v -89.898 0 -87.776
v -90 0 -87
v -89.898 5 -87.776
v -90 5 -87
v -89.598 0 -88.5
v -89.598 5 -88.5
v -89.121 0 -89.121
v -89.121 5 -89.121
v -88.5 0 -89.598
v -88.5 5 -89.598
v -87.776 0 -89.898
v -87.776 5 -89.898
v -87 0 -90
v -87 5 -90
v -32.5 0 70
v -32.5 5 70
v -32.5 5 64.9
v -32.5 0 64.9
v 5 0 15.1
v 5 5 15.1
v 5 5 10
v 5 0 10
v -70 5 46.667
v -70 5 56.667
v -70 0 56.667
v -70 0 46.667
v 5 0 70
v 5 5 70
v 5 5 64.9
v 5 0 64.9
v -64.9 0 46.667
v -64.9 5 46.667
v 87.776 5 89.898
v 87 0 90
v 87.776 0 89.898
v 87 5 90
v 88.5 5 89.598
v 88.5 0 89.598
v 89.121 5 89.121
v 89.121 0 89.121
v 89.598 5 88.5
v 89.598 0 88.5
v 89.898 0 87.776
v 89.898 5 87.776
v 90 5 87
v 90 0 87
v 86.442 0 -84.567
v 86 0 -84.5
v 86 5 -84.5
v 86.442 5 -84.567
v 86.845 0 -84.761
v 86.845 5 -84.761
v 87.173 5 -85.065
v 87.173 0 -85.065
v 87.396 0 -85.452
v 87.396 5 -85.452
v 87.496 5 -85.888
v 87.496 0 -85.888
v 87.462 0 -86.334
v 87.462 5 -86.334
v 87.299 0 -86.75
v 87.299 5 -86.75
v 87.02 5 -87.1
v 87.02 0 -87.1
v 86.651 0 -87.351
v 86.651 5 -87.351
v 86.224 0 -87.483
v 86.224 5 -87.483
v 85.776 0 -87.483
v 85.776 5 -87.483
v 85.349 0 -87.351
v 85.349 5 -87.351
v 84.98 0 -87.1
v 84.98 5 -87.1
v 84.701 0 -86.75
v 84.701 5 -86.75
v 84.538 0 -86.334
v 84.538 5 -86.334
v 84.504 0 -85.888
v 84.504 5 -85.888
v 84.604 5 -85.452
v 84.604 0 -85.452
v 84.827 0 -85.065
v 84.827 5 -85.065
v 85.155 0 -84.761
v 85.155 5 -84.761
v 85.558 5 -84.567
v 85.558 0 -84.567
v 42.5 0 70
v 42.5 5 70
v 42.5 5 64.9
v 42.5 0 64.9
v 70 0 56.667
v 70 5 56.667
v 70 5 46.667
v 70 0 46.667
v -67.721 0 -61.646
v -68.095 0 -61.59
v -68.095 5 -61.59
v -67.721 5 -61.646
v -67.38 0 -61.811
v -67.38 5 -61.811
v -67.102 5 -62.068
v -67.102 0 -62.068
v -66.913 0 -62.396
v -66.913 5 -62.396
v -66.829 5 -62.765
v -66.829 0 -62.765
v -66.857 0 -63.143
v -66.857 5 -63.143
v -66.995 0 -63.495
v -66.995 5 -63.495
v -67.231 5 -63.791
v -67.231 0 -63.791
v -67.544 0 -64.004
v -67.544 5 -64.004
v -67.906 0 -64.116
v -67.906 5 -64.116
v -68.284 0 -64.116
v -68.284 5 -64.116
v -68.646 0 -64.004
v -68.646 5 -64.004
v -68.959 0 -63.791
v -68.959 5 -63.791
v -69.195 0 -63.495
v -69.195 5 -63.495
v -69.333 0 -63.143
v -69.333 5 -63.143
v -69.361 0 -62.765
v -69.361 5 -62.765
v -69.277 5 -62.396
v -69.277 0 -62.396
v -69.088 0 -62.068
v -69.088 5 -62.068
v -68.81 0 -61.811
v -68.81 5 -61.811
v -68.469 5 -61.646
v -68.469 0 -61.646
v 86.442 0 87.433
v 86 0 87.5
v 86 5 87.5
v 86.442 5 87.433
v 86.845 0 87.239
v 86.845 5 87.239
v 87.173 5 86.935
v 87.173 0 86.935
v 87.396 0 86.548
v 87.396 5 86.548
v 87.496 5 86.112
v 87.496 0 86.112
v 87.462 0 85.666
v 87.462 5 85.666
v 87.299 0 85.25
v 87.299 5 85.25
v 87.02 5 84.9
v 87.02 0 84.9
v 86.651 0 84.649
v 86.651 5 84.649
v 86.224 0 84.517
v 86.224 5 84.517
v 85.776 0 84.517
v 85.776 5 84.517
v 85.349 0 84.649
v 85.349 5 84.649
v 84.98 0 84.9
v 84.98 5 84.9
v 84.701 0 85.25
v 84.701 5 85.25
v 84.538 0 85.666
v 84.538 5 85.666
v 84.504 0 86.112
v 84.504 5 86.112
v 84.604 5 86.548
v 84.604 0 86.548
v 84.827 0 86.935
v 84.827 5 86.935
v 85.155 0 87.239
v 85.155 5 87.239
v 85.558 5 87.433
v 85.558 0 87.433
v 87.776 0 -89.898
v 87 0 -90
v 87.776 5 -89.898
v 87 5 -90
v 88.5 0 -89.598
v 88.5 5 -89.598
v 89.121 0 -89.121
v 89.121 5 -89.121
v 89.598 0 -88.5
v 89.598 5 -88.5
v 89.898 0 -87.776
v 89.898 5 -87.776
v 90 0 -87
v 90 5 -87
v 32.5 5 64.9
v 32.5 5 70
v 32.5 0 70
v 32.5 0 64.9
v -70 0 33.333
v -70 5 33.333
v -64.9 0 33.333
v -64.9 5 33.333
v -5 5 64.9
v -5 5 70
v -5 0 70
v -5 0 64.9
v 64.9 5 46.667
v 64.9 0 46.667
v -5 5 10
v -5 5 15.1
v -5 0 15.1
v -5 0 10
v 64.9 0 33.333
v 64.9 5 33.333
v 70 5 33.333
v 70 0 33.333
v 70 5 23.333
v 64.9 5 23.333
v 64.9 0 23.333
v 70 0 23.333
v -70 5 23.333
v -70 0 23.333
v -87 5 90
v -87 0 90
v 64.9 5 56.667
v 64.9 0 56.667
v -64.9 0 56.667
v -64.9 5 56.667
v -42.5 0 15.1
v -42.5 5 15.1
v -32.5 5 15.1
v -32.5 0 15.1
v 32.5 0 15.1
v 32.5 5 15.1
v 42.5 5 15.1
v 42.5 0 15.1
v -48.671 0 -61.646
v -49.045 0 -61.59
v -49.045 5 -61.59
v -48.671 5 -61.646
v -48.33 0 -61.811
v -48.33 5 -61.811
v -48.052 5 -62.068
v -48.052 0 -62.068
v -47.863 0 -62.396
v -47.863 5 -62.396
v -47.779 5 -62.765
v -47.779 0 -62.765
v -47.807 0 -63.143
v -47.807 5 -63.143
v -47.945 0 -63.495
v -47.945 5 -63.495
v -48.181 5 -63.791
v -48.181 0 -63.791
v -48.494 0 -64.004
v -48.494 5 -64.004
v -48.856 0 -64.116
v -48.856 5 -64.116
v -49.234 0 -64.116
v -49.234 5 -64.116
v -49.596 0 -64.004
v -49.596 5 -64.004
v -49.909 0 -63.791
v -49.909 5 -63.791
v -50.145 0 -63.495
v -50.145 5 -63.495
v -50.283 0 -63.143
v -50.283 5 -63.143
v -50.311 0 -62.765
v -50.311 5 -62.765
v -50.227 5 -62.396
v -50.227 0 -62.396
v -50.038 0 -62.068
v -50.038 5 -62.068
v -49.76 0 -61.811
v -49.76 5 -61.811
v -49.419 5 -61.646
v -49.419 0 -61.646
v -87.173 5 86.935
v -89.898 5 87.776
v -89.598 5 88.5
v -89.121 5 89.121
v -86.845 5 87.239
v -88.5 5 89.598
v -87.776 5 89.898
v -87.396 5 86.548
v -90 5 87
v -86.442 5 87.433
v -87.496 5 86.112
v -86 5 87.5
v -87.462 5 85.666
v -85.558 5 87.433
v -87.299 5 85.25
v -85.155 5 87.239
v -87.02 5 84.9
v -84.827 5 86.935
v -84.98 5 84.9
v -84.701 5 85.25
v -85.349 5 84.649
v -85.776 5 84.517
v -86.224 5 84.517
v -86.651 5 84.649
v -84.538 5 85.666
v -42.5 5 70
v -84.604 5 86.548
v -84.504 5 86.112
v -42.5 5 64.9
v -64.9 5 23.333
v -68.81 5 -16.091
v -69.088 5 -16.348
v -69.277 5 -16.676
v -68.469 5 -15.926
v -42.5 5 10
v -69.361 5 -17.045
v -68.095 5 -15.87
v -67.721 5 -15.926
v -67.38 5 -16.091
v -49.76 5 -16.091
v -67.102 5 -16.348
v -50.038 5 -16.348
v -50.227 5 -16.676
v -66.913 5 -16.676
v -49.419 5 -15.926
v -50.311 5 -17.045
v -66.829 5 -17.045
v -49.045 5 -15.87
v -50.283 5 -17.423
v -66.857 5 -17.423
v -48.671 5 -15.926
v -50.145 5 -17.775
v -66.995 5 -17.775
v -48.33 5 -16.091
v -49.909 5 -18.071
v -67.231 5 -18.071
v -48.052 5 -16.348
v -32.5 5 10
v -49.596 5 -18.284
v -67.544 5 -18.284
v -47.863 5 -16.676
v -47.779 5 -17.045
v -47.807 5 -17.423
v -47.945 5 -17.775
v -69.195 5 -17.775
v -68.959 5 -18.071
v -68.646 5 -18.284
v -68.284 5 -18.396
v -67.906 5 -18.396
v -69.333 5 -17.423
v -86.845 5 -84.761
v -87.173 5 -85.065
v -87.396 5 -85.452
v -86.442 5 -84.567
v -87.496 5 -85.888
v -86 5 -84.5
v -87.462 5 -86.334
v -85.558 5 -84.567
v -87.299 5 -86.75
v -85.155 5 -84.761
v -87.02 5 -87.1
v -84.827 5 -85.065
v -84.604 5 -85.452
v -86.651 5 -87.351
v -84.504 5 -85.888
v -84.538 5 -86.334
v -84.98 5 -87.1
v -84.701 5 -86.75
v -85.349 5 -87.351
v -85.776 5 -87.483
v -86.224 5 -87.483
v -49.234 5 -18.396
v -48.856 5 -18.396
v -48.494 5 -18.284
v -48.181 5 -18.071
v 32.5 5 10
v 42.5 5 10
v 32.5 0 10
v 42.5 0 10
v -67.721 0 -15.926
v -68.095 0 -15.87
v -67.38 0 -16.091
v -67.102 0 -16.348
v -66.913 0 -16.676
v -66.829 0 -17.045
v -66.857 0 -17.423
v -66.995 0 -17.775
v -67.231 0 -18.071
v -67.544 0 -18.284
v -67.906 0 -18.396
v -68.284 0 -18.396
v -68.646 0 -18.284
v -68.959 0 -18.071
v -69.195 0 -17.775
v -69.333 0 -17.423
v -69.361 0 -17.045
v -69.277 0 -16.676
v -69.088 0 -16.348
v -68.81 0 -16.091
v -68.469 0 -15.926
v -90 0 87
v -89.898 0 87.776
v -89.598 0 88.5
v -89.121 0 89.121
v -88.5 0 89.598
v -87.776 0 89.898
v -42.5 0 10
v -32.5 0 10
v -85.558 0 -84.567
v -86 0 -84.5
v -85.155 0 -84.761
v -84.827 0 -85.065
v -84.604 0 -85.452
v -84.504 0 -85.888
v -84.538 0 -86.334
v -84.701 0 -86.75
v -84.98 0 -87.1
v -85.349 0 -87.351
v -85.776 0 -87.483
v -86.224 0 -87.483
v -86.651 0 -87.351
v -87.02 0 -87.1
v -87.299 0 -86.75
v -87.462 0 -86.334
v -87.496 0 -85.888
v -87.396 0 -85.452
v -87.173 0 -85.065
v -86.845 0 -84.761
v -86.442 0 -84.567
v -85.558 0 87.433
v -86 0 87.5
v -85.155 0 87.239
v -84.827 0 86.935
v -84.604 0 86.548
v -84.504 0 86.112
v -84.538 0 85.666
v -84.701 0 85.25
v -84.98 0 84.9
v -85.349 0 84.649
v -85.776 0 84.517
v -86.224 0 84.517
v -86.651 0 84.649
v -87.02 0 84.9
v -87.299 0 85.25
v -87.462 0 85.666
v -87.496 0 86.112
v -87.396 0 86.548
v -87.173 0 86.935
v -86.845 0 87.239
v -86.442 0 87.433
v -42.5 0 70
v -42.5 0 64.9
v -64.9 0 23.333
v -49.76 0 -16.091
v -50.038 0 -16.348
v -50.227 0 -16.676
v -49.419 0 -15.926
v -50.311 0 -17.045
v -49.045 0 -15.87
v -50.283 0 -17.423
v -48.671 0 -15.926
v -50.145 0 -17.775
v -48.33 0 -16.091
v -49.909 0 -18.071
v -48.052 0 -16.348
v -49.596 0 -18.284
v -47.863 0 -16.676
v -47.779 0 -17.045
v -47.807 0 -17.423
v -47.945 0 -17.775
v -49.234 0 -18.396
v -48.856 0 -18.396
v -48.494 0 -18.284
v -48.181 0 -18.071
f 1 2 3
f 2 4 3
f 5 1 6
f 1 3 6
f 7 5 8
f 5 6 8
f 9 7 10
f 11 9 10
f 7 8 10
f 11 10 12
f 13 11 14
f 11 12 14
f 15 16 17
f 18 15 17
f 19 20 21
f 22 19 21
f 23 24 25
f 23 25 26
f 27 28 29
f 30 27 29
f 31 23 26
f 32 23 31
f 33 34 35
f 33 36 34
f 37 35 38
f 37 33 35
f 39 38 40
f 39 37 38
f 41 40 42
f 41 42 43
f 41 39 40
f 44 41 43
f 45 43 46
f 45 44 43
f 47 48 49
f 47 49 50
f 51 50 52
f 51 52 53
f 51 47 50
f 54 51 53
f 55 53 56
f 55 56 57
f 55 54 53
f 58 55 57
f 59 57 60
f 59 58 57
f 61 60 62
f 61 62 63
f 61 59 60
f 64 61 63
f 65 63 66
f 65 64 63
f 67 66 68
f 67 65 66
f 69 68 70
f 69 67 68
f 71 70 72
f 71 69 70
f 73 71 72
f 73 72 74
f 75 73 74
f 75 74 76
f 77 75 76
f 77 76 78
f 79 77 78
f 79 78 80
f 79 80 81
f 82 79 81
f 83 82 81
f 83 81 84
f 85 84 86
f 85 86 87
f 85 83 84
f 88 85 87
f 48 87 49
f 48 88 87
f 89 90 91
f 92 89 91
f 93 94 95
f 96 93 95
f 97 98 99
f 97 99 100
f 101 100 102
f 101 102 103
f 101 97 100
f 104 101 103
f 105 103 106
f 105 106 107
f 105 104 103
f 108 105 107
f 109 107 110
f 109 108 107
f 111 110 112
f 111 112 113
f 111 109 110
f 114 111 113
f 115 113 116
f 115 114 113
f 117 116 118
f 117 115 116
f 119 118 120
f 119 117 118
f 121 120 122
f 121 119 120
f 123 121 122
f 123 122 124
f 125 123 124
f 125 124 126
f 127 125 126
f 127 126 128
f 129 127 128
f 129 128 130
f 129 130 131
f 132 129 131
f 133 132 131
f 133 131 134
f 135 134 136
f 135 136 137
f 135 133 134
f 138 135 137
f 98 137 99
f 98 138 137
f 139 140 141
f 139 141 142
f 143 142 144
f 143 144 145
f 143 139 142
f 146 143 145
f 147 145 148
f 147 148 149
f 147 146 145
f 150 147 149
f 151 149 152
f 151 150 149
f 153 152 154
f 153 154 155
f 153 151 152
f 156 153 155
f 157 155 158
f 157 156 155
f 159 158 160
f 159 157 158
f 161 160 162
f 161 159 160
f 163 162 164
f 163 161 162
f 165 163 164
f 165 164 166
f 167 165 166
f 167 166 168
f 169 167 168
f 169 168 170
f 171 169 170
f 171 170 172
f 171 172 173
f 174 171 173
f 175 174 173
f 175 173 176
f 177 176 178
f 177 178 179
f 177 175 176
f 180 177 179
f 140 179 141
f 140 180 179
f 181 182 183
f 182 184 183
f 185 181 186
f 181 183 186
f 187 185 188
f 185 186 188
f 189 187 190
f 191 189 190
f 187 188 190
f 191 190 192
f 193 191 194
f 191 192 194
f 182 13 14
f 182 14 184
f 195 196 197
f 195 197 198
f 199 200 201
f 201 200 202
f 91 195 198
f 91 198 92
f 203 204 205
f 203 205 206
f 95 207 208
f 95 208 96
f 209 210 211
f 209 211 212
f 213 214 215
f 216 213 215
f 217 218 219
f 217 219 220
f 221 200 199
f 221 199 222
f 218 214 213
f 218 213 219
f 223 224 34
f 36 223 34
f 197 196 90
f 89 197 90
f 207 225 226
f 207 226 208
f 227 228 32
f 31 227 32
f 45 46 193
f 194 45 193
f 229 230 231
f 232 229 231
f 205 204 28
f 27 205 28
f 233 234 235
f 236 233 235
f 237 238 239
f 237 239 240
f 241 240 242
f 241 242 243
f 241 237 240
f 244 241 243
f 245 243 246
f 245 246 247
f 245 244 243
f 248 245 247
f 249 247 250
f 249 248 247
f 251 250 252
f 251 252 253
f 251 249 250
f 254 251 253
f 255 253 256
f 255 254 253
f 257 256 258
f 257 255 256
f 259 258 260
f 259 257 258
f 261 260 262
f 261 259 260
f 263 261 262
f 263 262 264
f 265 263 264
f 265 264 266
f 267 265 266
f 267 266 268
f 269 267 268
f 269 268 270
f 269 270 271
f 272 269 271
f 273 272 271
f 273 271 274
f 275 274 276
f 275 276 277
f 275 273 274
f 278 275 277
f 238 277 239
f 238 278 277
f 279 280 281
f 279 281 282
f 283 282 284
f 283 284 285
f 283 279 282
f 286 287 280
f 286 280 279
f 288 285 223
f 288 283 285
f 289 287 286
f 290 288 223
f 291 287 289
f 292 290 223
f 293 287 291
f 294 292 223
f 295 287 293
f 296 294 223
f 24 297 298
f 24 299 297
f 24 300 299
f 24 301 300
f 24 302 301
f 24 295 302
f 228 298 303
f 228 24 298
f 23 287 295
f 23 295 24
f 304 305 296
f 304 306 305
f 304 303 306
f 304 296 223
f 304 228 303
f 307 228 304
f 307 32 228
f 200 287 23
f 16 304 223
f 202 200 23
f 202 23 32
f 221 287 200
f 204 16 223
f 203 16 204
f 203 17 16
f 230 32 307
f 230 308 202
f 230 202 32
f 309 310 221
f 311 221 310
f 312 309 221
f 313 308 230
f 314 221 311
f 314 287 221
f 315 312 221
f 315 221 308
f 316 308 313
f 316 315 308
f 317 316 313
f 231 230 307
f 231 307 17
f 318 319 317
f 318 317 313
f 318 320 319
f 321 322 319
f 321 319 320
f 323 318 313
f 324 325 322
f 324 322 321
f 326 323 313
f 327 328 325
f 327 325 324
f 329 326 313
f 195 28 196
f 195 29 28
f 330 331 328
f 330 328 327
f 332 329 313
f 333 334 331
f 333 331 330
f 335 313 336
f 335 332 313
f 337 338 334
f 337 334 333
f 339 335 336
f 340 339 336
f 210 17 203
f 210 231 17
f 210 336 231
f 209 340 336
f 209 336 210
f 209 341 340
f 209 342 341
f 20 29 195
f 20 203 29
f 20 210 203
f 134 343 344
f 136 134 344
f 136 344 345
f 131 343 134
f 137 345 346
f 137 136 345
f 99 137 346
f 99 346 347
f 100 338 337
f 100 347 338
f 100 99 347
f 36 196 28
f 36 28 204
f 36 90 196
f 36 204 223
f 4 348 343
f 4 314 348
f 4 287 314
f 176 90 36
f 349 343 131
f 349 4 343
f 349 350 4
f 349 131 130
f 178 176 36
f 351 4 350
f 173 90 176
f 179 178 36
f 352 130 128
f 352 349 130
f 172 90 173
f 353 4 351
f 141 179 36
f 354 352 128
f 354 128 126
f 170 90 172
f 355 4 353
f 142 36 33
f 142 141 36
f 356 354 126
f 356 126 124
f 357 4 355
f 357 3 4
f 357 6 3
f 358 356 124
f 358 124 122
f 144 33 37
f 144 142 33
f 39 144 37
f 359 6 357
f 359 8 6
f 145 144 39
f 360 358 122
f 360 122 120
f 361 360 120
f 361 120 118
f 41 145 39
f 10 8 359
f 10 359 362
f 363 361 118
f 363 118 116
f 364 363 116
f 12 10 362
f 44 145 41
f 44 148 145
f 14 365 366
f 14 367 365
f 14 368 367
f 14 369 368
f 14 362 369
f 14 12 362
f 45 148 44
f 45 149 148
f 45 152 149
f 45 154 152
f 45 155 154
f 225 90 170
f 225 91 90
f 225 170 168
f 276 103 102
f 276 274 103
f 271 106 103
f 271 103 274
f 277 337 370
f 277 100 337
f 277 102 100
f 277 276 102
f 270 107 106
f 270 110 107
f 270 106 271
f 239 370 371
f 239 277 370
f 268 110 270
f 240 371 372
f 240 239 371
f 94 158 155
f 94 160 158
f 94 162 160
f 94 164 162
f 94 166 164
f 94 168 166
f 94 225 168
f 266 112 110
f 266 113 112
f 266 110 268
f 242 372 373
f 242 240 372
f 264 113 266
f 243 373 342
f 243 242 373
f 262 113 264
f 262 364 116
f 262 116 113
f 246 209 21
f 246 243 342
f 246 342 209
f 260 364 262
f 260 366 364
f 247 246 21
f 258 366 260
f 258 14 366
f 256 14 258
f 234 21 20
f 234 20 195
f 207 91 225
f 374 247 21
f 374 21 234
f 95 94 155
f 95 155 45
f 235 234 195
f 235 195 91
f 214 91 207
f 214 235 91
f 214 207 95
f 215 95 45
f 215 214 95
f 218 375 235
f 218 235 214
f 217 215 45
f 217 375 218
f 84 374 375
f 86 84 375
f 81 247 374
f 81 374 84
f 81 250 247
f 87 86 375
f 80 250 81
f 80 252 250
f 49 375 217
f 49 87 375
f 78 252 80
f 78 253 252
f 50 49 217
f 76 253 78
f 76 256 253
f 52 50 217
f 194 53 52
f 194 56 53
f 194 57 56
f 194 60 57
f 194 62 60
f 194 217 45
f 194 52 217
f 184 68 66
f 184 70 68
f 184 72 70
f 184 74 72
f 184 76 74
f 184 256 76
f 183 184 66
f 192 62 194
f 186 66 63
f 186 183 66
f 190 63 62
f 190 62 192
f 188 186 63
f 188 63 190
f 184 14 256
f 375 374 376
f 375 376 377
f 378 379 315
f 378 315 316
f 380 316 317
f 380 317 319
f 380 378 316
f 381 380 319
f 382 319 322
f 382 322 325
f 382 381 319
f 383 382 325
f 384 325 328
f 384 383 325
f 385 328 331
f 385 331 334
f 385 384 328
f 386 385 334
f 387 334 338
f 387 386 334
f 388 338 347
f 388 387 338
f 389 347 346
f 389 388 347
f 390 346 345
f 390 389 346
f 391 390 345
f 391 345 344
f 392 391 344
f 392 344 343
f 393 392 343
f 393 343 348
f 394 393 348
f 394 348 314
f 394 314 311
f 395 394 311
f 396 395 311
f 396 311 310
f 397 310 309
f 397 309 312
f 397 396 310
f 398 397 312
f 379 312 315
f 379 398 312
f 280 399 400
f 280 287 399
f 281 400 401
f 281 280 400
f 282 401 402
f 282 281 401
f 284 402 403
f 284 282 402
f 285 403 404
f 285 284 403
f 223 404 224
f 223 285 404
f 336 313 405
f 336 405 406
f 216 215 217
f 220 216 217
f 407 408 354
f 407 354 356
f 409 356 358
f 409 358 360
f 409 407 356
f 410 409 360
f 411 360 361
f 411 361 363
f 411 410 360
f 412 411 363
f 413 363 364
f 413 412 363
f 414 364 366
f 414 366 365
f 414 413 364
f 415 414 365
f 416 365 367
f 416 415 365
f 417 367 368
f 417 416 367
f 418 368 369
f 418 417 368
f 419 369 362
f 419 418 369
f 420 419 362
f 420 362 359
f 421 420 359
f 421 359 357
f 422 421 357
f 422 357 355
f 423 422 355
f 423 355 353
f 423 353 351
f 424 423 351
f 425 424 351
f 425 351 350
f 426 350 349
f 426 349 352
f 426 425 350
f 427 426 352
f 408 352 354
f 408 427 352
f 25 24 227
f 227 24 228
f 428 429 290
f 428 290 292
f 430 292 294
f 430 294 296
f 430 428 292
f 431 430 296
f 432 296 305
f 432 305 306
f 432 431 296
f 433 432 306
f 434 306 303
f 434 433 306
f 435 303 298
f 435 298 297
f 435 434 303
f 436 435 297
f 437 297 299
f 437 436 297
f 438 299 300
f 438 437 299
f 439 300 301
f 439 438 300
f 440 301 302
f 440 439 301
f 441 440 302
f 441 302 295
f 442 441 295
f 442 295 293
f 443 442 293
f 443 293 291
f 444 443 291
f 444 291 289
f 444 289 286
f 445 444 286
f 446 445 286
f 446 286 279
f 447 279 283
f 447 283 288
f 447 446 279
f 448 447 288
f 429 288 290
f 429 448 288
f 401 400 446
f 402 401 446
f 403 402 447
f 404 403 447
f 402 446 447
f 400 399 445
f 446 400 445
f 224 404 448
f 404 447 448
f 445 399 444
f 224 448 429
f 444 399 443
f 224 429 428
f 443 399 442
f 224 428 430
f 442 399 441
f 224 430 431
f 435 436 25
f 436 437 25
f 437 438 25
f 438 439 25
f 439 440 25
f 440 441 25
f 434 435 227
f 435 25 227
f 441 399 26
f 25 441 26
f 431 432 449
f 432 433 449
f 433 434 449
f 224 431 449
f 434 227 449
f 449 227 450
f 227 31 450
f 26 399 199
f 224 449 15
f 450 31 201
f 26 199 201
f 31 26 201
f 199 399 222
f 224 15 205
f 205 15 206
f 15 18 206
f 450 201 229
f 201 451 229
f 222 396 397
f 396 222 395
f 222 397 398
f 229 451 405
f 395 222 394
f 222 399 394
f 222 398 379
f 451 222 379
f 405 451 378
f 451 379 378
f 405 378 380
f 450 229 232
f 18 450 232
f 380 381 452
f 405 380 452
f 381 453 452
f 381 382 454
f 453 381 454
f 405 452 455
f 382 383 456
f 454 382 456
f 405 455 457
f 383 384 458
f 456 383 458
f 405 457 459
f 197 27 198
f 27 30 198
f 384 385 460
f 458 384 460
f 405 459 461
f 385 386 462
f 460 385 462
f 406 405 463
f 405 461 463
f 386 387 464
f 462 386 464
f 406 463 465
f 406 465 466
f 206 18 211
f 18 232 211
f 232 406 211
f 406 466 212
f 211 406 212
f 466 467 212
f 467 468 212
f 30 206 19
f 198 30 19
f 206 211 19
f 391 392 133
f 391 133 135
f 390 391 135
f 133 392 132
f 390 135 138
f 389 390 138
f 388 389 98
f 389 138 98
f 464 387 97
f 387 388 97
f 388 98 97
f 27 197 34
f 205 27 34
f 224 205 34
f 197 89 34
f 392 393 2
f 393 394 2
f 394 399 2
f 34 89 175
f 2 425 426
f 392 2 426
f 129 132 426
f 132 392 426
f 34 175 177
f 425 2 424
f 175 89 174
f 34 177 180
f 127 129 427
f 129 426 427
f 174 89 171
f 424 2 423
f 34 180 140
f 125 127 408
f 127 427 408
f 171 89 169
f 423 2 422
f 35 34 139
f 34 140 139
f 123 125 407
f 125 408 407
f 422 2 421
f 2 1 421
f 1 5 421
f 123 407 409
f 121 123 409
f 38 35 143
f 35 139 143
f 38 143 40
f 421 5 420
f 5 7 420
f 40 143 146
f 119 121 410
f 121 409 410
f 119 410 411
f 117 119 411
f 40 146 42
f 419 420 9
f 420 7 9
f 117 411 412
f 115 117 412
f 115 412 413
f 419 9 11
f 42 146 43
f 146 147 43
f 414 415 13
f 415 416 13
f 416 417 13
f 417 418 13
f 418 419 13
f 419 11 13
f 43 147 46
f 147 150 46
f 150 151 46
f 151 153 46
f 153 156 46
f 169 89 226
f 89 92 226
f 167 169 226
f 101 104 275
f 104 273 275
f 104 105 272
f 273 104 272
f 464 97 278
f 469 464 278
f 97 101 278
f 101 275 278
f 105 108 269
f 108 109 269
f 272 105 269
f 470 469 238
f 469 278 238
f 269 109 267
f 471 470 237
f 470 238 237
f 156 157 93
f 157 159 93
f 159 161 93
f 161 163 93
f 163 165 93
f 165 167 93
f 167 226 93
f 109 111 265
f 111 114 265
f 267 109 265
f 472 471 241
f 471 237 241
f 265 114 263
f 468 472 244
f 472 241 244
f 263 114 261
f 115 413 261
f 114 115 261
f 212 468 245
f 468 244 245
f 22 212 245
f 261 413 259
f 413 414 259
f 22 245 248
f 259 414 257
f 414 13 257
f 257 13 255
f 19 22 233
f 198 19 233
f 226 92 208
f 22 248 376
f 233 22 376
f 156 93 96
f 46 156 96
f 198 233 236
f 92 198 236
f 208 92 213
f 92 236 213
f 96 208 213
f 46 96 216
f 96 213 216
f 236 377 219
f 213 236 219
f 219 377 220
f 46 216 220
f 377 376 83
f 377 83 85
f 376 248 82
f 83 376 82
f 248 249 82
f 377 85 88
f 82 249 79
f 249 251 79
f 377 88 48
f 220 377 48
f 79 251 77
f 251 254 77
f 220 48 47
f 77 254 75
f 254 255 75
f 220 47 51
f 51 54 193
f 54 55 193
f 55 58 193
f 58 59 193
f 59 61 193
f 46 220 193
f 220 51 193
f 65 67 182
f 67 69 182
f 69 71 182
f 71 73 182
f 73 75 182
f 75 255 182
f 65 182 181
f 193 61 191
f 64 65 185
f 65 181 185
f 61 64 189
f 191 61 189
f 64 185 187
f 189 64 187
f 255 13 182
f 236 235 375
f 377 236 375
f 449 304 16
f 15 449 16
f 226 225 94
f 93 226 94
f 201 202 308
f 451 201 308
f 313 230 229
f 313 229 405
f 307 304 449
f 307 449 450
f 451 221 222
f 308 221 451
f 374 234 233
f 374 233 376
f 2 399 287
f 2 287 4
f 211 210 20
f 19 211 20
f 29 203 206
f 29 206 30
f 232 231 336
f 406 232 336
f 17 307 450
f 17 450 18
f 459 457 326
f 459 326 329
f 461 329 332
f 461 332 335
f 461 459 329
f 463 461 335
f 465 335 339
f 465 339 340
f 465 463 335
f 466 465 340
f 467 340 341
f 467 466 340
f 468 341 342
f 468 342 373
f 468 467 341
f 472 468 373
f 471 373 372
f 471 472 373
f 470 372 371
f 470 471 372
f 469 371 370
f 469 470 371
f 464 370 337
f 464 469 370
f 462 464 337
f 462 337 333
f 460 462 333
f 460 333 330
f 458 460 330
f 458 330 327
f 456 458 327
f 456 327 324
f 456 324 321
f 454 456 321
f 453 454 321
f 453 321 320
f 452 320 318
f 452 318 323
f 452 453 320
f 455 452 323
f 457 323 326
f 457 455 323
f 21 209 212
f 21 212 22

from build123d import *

# Parameters (mm, degrees)
SKETCH1_W           = 180
SKETCH1_H           = 180
SKETCH1_R           = 1.5
SKETCH1_W_2         = 22.7
SKETCH1_H_2         = 50.8
SKETCH1_R_2         = 1.27
BOSS_EXTRUDE1_DEPTH = 5
CUT_EXTRUDE1_REACH  = 129.377
SKETCH4_W           = 10
SKETCH4_H           = 5.1
SKETCH4_W_2         = 5.1
SKETCH4_H_2         = 10
FILLET1_R           = 3


with BuildPart() as part:
    # Sketch1 → Boss-Extrude1 (new body)
    # profile 1 of 2: a face of its own
    with BuildSketch(Plane(origin=(0, 0, 0), x_dir=(1, 0, 0), z_dir=(0, 1, 0))):
        Rectangle(SKETCH1_W, SKETCH1_H)
        with Locations(Location((-86, -86, 0), (0, 0, 270))):
            Circle(SKETCH1_R, mode=Mode.SUBTRACT)
        with Locations(Location((86, -86, 0), (0, 0, 270))):
            Circle(SKETCH1_R, mode=Mode.SUBTRACT)
        with Locations(Location((86, 86, 0), (0, 0, 270))):
            Circle(SKETCH1_R, mode=Mode.SUBTRACT)
        with Locations(Location((-86, 86, 0), (0, 0, 270))):
            Circle(SKETCH1_R, mode=Mode.SUBTRACT)
        with Locations((-58.65, 40)):
            Rectangle(SKETCH1_W_2, SKETCH1_H_2, mode=Mode.SUBTRACT)
    # profile 2 of 2: a face of its own
    with BuildSketch(Plane(origin=(0, 0, 0), x_dir=(1, 0, 0), z_dir=(0, 1, 0))):
        with Locations((-58.65, 40)):
            Rectangle(SKETCH1_W_2, SKETCH1_H_2)
        with Locations(Location((-68.095, 17.14, 0), (0, 0, 270))):
            Circle(SKETCH1_R_2, mode=Mode.SUBTRACT)
        with Locations(Location((-49.045, 17.14, 0), (0, 0, 270))):
            Circle(SKETCH1_R_2, mode=Mode.SUBTRACT)
        with Locations(Location((-49.045, 62.86, 0), (0, 0, 270))):
            Circle(SKETCH1_R_2, mode=Mode.SUBTRACT)
        with Locations(Location((-68.095, 62.86, 0), (0, 0, 270))):
            Circle(SKETCH1_R_2, mode=Mode.SUBTRACT)
    extrude(amount=BOSS_EXTRUDE1_DEPTH)

    # Sketch4 → Cut-Extrude1 (cut, up to next)
    with BuildSketch(Plane(origin=(0, 5, 0), x_dir=(1, 0, 0), z_dir=(0, 1, 0)), mode=Mode.PRIVATE) as cut_extrude1_sk1:
        with Locations((37.5, -12.55)):
            Rectangle(SKETCH4_W, SKETCH4_H)
    cut_extrude1_tool1 = extrude(cut_extrude1_sk1.sketch, amount=-CUT_EXTRUDE1_REACH, mode=Mode.PRIVATE) & part.part
    # Sketch4 → Cut-Extrude1 (cut, up to next)
    with BuildSketch(Plane(origin=(0, 5, 0), x_dir=(1, 0, 0), z_dir=(0, 1, 0)), mode=Mode.PRIVATE) as cut_extrude1_sk2:
        with Locations((0, -12.55)):
            Rectangle(SKETCH4_W, SKETCH4_H)
    cut_extrude1_tool2 = extrude(cut_extrude1_sk2.sketch, amount=-CUT_EXTRUDE1_REACH, mode=Mode.PRIVATE) & part.part
    # Sketch4 → Cut-Extrude1 (cut, up to next)
    with BuildSketch(Plane(origin=(0, 5, 0), x_dir=(1, 0, 0), z_dir=(0, 1, 0)), mode=Mode.PRIVATE) as cut_extrude1_sk3:
        with Locations((-37.5, -12.55)):
            Rectangle(SKETCH4_W, SKETCH4_H)
    cut_extrude1_tool3 = extrude(cut_extrude1_sk3.sketch, amount=-CUT_EXTRUDE1_REACH, mode=Mode.PRIVATE) & part.part
    # Sketch4 → Cut-Extrude1 (cut, up to next)
    with BuildSketch(Plane(origin=(0, 5, 0), x_dir=(1, 0, 0), z_dir=(0, 1, 0)), mode=Mode.PRIVATE) as cut_extrude1_sk4:
        with Locations((37.5, -67.45)):
            Rectangle(SKETCH4_W, SKETCH4_H)
    cut_extrude1_tool4 = extrude(cut_extrude1_sk4.sketch, amount=-CUT_EXTRUDE1_REACH, mode=Mode.PRIVATE) & part.part
    # Sketch4 → Cut-Extrude1 (cut, up to next)
    with BuildSketch(Plane(origin=(0, 5, 0), x_dir=(1, 0, 0), z_dir=(0, 1, 0)), mode=Mode.PRIVATE) as cut_extrude1_sk5:
        with Locations((0, -67.45)):
            Rectangle(SKETCH4_W, SKETCH4_H)
    cut_extrude1_tool5 = extrude(cut_extrude1_sk5.sketch, amount=-CUT_EXTRUDE1_REACH, mode=Mode.PRIVATE) & part.part
    # Sketch4 → Cut-Extrude1 (cut, up to next)
    with BuildSketch(Plane(origin=(0, 5, 0), x_dir=(1, 0, 0), z_dir=(0, 1, 0)), mode=Mode.PRIVATE) as cut_extrude1_sk6:
        with Locations((-37.5, -67.45)):
            Rectangle(SKETCH4_W, SKETCH4_H)
    cut_extrude1_tool6 = extrude(cut_extrude1_sk6.sketch, amount=-CUT_EXTRUDE1_REACH, mode=Mode.PRIVATE) & part.part
    # Sketch4 → Cut-Extrude1 (cut, up to next)
    with BuildSketch(Plane(origin=(0, 5, 0), x_dir=(1, 0, 0), z_dir=(0, 1, 0)), mode=Mode.PRIVATE) as cut_extrude1_sk7:
        with Locations((-67.45, -51.666666667)):
            Rectangle(SKETCH4_W_2, SKETCH4_H_2)
    cut_extrude1_tool7 = extrude(cut_extrude1_sk7.sketch, amount=-CUT_EXTRUDE1_REACH, mode=Mode.PRIVATE) & part.part
    # Sketch4 → Cut-Extrude1 (cut, up to next)
    with BuildSketch(Plane(origin=(0, 5, 0), x_dir=(1, 0, 0), z_dir=(0, 1, 0)), mode=Mode.PRIVATE) as cut_extrude1_sk8:
        with Locations((-67.45, -28.333333333)):
            Rectangle(SKETCH4_W_2, SKETCH4_H_2)
    cut_extrude1_tool8 = extrude(cut_extrude1_sk8.sketch, amount=-CUT_EXTRUDE1_REACH, mode=Mode.PRIVATE) & part.part
    # Sketch4 → Cut-Extrude1 (cut, up to next)
    with BuildSketch(Plane(origin=(0, 5, 0), x_dir=(1, 0, 0), z_dir=(0, 1, 0)), mode=Mode.PRIVATE) as cut_extrude1_sk9:
        with Locations((67.45, -28.333333333)):
            Rectangle(SKETCH4_W_2, SKETCH4_H_2)
    cut_extrude1_tool9 = extrude(cut_extrude1_sk9.sketch, amount=-CUT_EXTRUDE1_REACH, mode=Mode.PRIVATE) & part.part
    # Sketch4 → Cut-Extrude1 (cut, up to next)
    with BuildSketch(Plane(origin=(0, 5, 0), x_dir=(1, 0, 0), z_dir=(0, 1, 0)), mode=Mode.PRIVATE) as cut_extrude1_sk10:
        with Locations((67.45, -51.666666667)):
            Rectangle(SKETCH4_W_2, SKETCH4_H_2)
    cut_extrude1_tool10 = extrude(cut_extrude1_sk10.sketch, amount=-CUT_EXTRUDE1_REACH, mode=Mode.PRIVATE) & part.part
    add(cut_extrude1_tool1.solids().sort_by_distance((37.5, 5, 12.55))[0], mode=Mode.SUBTRACT)
    add(cut_extrude1_tool2.solids().sort_by_distance((0, 5, 12.55))[0], mode=Mode.SUBTRACT)
    add(cut_extrude1_tool3.solids().sort_by_distance((-37.5, 5, 12.55))[0], mode=Mode.SUBTRACT)
    add(cut_extrude1_tool4.solids().sort_by_distance((37.5, 5, 67.45))[0], mode=Mode.SUBTRACT)
    add(cut_extrude1_tool5.solids().sort_by_distance((0, 5, 67.45))[0], mode=Mode.SUBTRACT)
    add(cut_extrude1_tool6.solids().sort_by_distance((-37.5, 5, 67.45))[0], mode=Mode.SUBTRACT)
    add(cut_extrude1_tool7.solids().sort_by_distance((-67.45, 5, 51.666667))[0], mode=Mode.SUBTRACT)
    add(cut_extrude1_tool8.solids().sort_by_distance((-67.45, 5, 28.333333))[0], mode=Mode.SUBTRACT)
    add(cut_extrude1_tool9.solids().sort_by_distance((67.45, 5, 28.333333))[0], mode=Mode.SUBTRACT)
    add(cut_extrude1_tool10.solids().sort_by_distance((67.45, 5, 51.666667))[0], mode=Mode.SUBTRACT)

    # Fillet1
    fillet1_edges = [part.edges().sort_by_distance(p)[0] for p in [
        (-90, 2.5, 90),
        (-90, 2.5, -90),
        (90, 2.5, -90),
        (90, 2.5, 90),
    ]]
    fillet(fillet1_edges, radius=FILLET1_R)


solid = part.part
